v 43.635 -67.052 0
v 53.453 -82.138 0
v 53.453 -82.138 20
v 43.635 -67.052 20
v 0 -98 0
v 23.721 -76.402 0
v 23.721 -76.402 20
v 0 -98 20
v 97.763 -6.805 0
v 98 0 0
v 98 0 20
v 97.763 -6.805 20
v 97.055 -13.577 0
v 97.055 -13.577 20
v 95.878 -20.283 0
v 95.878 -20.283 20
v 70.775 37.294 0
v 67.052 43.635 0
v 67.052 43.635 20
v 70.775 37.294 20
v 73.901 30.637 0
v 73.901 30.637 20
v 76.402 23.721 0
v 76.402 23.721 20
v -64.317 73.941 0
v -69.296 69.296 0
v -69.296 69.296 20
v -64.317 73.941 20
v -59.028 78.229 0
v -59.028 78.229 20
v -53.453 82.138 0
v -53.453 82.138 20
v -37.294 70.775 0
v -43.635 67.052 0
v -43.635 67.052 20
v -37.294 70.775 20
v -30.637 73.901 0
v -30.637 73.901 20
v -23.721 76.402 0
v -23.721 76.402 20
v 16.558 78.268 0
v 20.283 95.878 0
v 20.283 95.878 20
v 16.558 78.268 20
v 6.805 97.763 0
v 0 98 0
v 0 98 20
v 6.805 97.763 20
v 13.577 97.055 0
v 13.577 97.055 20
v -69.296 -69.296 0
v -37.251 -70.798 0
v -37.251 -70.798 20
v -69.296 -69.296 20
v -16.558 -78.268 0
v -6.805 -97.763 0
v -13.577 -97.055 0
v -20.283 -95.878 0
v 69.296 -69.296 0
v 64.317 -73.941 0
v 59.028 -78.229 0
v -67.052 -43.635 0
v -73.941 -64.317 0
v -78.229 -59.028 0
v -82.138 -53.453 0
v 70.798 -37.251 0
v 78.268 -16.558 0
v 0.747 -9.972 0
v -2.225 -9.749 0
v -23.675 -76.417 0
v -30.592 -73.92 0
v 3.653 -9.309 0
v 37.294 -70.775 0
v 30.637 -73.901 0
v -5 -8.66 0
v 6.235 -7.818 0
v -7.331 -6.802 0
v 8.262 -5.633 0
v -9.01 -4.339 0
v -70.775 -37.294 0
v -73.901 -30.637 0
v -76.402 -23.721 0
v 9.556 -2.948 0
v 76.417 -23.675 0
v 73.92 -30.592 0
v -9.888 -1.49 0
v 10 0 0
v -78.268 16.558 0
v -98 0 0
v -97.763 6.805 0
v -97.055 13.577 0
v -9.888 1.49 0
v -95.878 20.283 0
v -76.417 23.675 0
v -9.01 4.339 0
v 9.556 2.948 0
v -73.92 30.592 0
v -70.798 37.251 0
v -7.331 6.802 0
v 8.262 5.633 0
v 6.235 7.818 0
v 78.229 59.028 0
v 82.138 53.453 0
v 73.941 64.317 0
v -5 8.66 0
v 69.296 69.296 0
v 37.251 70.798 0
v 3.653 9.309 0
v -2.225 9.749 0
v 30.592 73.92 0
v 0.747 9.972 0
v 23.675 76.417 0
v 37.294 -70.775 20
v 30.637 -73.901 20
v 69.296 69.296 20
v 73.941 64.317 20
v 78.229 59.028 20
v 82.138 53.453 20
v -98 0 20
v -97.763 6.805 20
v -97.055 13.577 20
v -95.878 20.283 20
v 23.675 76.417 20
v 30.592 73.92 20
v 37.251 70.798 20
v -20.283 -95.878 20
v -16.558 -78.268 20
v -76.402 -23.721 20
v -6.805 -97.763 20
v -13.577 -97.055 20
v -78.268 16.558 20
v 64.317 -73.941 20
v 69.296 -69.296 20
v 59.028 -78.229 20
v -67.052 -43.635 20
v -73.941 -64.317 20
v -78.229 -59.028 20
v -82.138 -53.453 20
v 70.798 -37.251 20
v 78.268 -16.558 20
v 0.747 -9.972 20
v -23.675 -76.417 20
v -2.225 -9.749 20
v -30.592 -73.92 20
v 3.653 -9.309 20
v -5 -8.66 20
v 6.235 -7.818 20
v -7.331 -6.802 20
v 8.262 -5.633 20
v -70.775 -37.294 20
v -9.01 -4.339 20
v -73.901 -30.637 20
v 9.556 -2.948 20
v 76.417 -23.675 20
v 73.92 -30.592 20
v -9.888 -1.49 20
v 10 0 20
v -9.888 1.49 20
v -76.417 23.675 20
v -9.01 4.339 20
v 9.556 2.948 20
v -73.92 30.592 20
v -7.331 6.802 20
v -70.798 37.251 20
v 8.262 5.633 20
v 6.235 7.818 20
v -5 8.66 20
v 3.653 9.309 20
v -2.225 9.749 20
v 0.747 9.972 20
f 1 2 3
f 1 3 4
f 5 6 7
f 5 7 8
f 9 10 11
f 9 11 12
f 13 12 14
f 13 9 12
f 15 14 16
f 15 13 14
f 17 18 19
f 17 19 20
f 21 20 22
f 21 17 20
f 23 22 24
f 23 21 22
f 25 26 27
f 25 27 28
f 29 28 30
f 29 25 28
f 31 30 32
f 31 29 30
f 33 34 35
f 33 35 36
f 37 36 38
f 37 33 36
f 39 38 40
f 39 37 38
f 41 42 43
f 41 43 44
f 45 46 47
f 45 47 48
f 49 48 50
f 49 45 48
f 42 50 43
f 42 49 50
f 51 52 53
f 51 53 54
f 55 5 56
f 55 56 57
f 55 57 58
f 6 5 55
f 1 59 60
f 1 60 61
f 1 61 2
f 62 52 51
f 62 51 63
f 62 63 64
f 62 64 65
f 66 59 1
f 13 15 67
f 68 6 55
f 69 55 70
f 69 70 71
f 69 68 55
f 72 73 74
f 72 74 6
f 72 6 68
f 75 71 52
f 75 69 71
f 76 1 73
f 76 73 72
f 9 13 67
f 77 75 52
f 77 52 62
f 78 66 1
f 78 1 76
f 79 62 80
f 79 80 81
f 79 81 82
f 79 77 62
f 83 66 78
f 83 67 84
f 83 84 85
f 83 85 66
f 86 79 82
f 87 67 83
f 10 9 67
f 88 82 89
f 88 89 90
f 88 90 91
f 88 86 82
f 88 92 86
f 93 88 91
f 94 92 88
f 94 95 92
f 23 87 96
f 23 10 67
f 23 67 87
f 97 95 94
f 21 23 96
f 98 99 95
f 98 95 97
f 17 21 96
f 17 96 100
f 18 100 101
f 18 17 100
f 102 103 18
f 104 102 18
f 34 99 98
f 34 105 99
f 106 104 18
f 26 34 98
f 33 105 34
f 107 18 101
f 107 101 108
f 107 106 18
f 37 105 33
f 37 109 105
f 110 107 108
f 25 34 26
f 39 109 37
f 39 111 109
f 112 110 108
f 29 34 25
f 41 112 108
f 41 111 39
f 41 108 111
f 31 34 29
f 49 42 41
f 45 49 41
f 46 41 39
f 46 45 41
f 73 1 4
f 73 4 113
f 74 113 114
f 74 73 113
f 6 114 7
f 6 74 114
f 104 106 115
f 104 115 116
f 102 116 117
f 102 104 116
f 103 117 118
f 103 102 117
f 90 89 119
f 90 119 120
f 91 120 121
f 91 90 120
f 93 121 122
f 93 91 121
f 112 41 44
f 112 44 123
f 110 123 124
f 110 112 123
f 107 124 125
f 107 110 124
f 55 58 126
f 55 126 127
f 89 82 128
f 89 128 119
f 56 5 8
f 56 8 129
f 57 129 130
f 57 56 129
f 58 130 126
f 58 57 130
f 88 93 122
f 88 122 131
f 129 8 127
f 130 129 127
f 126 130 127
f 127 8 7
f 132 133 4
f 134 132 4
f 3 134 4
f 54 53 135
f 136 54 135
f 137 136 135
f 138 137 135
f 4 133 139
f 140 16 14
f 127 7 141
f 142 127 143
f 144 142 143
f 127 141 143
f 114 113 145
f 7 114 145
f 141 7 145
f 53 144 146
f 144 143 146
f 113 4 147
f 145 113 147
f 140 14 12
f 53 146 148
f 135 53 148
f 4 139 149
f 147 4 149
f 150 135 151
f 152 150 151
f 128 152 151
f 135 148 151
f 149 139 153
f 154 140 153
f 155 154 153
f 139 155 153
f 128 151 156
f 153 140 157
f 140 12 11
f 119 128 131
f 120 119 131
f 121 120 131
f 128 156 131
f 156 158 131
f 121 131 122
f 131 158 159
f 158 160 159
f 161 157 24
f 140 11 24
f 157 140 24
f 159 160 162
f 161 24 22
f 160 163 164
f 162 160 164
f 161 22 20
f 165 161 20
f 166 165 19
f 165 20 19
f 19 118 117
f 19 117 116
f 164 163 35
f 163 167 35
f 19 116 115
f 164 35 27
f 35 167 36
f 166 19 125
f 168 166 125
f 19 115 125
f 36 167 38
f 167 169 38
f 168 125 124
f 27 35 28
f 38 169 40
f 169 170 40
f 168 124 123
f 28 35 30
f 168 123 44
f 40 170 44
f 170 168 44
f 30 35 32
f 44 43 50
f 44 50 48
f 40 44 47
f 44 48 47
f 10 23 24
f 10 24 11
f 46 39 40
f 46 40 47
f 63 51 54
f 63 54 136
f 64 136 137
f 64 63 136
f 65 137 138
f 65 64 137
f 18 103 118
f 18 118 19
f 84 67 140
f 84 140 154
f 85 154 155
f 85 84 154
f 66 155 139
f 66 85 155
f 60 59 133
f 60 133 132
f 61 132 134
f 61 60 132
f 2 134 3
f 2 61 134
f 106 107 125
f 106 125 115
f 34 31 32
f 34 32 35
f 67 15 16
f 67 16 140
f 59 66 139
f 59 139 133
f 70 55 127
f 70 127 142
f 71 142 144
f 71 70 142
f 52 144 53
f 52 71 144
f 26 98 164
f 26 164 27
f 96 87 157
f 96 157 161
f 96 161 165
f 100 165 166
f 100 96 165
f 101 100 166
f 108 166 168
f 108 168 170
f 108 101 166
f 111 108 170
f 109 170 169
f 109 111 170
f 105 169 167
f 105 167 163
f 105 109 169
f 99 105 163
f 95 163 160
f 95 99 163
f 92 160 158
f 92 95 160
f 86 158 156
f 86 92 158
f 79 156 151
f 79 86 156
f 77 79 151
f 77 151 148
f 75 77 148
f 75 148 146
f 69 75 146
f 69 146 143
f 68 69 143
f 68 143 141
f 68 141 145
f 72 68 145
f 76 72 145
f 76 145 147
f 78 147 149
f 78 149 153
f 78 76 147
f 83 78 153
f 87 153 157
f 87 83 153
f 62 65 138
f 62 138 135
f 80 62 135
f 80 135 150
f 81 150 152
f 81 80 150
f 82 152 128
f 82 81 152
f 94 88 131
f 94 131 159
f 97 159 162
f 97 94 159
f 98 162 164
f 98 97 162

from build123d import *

# Parameters (mm, degrees)
BOSS_EXTRUDE1_DEPTH     = 20
CIRPATTERN1_COUNT       = 8
SKETCH3_R               = 10
CUT_EXTRUDE1_DEPTH      = 20
CUT_EXTRUDE1_DEPTH_BACK = 7


with BuildPart() as part:
    # Sketch1 → Boss-Extrude1 (new body)
    with BuildSketch(Plane.XY):
        with BuildLine():
            Line((95.877968476, -20.283371538), (78.267729368, -16.557854317))
            ThreePointArc((78.267729368, -16.557854317), (75.247619253, -27.162396743), (70.798070264, -37.250949611))
            Line((70.798070264, -37.250949611), (0, 0))
            Line((0, 0), (76.402194654, 23.721396503))
            Line((76.402194654, 23.721396503), (98, 0))
            ThreePointArc((98, 0), (97.468048382, -10.197036074), (95.877968476, -20.283371538))
        make_face()
    boss_extrude1 = extrude(amount=BOSS_EXTRUDE1_DEPTH)

    # CirPattern1: Boss-Extrude1 ×8 about axis
    cirpattern1_axis = Axis((0, 0, 0), (0, 0, 1))
    for i in range(1, CIRPATTERN1_COUNT):
        add(boss_extrude1.rotate(cirpattern1_axis, i * 360 / CIRPATTERN1_COUNT))

    # Sketch3 → Cut-Extrude1 (cut, two sides)
    with BuildSketch(Plane.XY) as cut_extrude1_sk:
        Circle(SKETCH3_R)
    extrude(amount=CUT_EXTRUDE1_DEPTH, mode=Mode.SUBTRACT)
    extrude(cut_extrude1_sk.sketch, amount=-CUT_EXTRUDE1_DEPTH_BACK, mode=Mode.SUBTRACT)


solid = part.part
